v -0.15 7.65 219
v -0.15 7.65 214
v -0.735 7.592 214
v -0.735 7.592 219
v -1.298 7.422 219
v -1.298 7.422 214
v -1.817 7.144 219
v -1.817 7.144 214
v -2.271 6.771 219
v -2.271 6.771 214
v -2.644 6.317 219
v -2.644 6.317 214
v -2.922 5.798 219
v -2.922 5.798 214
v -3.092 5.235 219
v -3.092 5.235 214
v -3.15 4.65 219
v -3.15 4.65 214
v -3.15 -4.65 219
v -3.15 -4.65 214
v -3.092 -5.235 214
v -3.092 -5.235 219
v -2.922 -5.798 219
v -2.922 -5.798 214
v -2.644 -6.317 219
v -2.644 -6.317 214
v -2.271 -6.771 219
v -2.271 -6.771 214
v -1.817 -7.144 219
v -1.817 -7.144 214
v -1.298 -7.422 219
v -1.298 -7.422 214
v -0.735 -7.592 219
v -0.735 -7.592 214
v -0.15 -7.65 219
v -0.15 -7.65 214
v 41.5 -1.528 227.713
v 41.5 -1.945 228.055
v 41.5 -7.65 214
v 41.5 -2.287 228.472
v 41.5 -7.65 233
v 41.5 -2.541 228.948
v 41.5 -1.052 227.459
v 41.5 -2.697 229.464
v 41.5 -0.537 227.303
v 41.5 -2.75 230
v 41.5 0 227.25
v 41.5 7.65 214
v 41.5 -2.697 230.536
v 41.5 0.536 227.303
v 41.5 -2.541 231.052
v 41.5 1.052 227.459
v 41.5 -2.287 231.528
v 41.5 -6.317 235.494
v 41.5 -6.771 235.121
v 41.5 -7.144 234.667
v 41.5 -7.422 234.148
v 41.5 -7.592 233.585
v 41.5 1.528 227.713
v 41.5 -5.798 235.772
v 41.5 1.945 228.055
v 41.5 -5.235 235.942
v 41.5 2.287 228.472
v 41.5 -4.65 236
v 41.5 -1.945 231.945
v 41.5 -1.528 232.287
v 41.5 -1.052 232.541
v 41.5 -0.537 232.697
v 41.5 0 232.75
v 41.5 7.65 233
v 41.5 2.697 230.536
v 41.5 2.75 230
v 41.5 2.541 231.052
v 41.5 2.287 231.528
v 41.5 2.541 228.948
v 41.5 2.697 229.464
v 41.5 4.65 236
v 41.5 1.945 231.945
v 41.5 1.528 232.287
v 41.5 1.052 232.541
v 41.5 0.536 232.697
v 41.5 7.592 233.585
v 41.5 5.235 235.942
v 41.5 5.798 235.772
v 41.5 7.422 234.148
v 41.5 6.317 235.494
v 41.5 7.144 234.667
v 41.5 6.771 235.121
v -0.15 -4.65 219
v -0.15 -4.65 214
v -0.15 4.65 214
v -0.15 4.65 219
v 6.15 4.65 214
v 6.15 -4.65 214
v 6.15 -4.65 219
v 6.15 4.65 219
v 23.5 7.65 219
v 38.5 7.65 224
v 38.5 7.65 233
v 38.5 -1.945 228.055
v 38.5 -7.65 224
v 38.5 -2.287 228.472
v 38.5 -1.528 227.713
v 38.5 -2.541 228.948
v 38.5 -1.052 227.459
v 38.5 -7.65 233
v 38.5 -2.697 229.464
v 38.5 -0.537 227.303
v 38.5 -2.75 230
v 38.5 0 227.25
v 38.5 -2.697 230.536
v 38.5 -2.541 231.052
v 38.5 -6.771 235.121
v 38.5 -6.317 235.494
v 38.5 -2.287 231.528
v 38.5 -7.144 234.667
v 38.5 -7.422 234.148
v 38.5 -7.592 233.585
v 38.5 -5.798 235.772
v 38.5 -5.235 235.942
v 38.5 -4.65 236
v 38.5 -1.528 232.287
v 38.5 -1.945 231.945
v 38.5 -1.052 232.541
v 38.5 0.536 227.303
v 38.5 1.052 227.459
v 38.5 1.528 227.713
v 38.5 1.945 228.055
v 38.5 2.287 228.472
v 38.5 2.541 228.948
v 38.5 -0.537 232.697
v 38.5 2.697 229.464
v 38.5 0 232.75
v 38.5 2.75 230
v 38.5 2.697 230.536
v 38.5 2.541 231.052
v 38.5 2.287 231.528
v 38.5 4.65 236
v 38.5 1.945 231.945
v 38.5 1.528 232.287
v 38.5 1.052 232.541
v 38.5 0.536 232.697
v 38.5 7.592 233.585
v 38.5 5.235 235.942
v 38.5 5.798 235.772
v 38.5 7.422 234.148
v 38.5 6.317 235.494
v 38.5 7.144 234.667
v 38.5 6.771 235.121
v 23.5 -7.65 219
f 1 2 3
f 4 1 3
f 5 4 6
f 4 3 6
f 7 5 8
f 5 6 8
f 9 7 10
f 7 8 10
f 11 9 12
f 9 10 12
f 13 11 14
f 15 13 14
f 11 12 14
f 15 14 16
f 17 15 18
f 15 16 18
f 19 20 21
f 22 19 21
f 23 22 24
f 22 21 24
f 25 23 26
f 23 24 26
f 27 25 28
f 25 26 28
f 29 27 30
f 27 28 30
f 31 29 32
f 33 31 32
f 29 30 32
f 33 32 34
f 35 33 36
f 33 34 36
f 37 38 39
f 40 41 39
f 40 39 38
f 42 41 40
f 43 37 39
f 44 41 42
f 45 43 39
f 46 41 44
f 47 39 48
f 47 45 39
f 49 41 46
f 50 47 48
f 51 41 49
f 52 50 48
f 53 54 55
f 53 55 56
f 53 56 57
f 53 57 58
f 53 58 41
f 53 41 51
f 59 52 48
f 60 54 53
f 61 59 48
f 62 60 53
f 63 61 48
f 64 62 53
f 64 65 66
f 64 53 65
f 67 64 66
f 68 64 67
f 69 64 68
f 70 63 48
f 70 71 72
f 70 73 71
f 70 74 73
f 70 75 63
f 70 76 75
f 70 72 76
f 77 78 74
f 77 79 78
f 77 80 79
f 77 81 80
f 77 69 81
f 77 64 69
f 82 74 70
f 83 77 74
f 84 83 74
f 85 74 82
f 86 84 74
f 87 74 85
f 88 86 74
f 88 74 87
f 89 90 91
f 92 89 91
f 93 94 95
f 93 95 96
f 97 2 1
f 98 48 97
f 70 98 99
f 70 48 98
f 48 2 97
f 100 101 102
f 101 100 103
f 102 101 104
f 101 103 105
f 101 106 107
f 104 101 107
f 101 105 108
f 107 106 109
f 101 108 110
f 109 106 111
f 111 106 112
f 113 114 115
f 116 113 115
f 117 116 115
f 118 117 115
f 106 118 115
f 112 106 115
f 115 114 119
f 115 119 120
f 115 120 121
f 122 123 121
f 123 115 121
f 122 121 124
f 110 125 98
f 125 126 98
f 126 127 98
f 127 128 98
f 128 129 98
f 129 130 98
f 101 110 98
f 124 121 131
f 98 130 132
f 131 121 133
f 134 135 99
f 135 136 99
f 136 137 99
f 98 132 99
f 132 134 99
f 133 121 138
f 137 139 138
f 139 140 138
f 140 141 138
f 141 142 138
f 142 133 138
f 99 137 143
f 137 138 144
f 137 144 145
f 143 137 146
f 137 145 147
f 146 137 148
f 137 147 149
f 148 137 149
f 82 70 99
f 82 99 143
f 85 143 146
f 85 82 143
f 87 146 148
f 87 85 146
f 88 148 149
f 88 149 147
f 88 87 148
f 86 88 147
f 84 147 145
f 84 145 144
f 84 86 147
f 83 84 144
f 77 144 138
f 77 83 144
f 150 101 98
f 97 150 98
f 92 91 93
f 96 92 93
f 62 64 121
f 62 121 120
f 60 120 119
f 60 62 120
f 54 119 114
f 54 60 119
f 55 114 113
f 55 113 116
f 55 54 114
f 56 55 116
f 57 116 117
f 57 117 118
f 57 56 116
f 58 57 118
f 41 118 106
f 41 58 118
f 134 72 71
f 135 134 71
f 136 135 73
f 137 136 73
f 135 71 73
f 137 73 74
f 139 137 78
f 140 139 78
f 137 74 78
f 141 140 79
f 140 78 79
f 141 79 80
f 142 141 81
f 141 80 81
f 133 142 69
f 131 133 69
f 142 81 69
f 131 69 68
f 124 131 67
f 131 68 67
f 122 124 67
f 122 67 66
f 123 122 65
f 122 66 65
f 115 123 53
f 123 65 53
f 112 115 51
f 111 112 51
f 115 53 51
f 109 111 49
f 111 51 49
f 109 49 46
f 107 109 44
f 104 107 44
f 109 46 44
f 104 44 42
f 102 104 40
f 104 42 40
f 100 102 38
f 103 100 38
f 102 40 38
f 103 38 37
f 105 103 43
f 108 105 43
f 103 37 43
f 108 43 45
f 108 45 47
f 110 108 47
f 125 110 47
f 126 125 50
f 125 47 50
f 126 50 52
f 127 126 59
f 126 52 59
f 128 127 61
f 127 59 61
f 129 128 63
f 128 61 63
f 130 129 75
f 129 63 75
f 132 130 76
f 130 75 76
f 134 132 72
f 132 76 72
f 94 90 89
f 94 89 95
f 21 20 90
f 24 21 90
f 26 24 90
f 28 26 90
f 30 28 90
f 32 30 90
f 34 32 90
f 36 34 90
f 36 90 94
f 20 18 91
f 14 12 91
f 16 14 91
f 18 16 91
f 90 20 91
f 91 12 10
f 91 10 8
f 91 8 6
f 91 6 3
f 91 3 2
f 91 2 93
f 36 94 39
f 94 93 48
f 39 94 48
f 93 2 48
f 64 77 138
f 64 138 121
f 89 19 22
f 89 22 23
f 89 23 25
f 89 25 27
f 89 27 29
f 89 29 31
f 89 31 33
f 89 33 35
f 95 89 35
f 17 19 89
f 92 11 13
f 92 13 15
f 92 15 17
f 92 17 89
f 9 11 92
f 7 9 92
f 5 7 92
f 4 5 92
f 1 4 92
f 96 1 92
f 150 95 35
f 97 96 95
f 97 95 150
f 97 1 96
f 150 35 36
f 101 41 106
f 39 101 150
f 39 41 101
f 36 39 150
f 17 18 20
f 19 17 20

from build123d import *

# Parameters (mm, degrees)
SKETCH063_W   = 6.3
SKETCH063_H   = 9.3
PAD029_DEPTH  = 5
SKETCH064_R   = 2.75
PAD030_DEPTH  = 3
CHAMFER_SIZE2 = 5
CHAMFER_SIZE  = 15


with BuildPart() as part:
    # Sketch063 → Pad029 (new body)
    with BuildSketch(Plane.XY):
        with BuildLine():
            Line((-6.15, 4.65), (-6.15, -4.65))
            ThreePointArc((-6.15, -4.65), (-5.2713203436, -6.7713203436), (-3.15, -7.65))
            Line((-3.15, -7.65), (38.5, -7.65))
            Line((38.5, -7.65), (38.5, 7.65))
            Line((38.5, 7.65), (-3.15, 7.65))
            ThreePointArc((-3.15, 7.65), (-5.2713203436, 6.7713203436), (-6.15, 4.65))
        make_face()
        Rectangle(SKETCH063_W, SKETCH063_H, mode=Mode.SUBTRACT)
    extrude(amount=PAD029_DEPTH)

    # Sketch064 (on Face4 of Pad029) → Pad030 (join)
    with BuildSketch(Plane.YZ.offset(38.5)):
        with BuildLine():
            Line((-7.65, 19), (-7.65, 5))
            Line((-7.65, 5), (7.65, 5))
            Line((7.65, 5), (7.65, 19))
            ThreePointArc((7.65, 19), (6.7713203436, 21.1213203436), (4.65, 22))
            Line((4.65, 22), (-4.65, 22))
            ThreePointArc((-4.65, 22), (-6.7713203436, 21.1213203436), (-7.65, 19))
        make_face()
        with Locations((0, 16)):
            Circle(SKETCH064_R, mode=Mode.SUBTRACT)
    extrude(amount=-PAD030_DEPTH)

    # Chamfer
    chamfer_edges = [part.edges().sort_by_distance(p)[0] for p in [
        (35.5, 0, 5),
    ]]
    chamfer_side = part.faces().sort_by_distance((16.306308, 0, 5))[0]
    chamfer(chamfer_edges, length=CHAMFER_SIZE, length2=CHAMFER_SIZE2, reference=chamfer_side)


with BuildPart() as part_1:
    # Body017 placement: moved
    add(part.part.moved(Location((3, -2.563e-05, 214))))


solid = part_1.part
